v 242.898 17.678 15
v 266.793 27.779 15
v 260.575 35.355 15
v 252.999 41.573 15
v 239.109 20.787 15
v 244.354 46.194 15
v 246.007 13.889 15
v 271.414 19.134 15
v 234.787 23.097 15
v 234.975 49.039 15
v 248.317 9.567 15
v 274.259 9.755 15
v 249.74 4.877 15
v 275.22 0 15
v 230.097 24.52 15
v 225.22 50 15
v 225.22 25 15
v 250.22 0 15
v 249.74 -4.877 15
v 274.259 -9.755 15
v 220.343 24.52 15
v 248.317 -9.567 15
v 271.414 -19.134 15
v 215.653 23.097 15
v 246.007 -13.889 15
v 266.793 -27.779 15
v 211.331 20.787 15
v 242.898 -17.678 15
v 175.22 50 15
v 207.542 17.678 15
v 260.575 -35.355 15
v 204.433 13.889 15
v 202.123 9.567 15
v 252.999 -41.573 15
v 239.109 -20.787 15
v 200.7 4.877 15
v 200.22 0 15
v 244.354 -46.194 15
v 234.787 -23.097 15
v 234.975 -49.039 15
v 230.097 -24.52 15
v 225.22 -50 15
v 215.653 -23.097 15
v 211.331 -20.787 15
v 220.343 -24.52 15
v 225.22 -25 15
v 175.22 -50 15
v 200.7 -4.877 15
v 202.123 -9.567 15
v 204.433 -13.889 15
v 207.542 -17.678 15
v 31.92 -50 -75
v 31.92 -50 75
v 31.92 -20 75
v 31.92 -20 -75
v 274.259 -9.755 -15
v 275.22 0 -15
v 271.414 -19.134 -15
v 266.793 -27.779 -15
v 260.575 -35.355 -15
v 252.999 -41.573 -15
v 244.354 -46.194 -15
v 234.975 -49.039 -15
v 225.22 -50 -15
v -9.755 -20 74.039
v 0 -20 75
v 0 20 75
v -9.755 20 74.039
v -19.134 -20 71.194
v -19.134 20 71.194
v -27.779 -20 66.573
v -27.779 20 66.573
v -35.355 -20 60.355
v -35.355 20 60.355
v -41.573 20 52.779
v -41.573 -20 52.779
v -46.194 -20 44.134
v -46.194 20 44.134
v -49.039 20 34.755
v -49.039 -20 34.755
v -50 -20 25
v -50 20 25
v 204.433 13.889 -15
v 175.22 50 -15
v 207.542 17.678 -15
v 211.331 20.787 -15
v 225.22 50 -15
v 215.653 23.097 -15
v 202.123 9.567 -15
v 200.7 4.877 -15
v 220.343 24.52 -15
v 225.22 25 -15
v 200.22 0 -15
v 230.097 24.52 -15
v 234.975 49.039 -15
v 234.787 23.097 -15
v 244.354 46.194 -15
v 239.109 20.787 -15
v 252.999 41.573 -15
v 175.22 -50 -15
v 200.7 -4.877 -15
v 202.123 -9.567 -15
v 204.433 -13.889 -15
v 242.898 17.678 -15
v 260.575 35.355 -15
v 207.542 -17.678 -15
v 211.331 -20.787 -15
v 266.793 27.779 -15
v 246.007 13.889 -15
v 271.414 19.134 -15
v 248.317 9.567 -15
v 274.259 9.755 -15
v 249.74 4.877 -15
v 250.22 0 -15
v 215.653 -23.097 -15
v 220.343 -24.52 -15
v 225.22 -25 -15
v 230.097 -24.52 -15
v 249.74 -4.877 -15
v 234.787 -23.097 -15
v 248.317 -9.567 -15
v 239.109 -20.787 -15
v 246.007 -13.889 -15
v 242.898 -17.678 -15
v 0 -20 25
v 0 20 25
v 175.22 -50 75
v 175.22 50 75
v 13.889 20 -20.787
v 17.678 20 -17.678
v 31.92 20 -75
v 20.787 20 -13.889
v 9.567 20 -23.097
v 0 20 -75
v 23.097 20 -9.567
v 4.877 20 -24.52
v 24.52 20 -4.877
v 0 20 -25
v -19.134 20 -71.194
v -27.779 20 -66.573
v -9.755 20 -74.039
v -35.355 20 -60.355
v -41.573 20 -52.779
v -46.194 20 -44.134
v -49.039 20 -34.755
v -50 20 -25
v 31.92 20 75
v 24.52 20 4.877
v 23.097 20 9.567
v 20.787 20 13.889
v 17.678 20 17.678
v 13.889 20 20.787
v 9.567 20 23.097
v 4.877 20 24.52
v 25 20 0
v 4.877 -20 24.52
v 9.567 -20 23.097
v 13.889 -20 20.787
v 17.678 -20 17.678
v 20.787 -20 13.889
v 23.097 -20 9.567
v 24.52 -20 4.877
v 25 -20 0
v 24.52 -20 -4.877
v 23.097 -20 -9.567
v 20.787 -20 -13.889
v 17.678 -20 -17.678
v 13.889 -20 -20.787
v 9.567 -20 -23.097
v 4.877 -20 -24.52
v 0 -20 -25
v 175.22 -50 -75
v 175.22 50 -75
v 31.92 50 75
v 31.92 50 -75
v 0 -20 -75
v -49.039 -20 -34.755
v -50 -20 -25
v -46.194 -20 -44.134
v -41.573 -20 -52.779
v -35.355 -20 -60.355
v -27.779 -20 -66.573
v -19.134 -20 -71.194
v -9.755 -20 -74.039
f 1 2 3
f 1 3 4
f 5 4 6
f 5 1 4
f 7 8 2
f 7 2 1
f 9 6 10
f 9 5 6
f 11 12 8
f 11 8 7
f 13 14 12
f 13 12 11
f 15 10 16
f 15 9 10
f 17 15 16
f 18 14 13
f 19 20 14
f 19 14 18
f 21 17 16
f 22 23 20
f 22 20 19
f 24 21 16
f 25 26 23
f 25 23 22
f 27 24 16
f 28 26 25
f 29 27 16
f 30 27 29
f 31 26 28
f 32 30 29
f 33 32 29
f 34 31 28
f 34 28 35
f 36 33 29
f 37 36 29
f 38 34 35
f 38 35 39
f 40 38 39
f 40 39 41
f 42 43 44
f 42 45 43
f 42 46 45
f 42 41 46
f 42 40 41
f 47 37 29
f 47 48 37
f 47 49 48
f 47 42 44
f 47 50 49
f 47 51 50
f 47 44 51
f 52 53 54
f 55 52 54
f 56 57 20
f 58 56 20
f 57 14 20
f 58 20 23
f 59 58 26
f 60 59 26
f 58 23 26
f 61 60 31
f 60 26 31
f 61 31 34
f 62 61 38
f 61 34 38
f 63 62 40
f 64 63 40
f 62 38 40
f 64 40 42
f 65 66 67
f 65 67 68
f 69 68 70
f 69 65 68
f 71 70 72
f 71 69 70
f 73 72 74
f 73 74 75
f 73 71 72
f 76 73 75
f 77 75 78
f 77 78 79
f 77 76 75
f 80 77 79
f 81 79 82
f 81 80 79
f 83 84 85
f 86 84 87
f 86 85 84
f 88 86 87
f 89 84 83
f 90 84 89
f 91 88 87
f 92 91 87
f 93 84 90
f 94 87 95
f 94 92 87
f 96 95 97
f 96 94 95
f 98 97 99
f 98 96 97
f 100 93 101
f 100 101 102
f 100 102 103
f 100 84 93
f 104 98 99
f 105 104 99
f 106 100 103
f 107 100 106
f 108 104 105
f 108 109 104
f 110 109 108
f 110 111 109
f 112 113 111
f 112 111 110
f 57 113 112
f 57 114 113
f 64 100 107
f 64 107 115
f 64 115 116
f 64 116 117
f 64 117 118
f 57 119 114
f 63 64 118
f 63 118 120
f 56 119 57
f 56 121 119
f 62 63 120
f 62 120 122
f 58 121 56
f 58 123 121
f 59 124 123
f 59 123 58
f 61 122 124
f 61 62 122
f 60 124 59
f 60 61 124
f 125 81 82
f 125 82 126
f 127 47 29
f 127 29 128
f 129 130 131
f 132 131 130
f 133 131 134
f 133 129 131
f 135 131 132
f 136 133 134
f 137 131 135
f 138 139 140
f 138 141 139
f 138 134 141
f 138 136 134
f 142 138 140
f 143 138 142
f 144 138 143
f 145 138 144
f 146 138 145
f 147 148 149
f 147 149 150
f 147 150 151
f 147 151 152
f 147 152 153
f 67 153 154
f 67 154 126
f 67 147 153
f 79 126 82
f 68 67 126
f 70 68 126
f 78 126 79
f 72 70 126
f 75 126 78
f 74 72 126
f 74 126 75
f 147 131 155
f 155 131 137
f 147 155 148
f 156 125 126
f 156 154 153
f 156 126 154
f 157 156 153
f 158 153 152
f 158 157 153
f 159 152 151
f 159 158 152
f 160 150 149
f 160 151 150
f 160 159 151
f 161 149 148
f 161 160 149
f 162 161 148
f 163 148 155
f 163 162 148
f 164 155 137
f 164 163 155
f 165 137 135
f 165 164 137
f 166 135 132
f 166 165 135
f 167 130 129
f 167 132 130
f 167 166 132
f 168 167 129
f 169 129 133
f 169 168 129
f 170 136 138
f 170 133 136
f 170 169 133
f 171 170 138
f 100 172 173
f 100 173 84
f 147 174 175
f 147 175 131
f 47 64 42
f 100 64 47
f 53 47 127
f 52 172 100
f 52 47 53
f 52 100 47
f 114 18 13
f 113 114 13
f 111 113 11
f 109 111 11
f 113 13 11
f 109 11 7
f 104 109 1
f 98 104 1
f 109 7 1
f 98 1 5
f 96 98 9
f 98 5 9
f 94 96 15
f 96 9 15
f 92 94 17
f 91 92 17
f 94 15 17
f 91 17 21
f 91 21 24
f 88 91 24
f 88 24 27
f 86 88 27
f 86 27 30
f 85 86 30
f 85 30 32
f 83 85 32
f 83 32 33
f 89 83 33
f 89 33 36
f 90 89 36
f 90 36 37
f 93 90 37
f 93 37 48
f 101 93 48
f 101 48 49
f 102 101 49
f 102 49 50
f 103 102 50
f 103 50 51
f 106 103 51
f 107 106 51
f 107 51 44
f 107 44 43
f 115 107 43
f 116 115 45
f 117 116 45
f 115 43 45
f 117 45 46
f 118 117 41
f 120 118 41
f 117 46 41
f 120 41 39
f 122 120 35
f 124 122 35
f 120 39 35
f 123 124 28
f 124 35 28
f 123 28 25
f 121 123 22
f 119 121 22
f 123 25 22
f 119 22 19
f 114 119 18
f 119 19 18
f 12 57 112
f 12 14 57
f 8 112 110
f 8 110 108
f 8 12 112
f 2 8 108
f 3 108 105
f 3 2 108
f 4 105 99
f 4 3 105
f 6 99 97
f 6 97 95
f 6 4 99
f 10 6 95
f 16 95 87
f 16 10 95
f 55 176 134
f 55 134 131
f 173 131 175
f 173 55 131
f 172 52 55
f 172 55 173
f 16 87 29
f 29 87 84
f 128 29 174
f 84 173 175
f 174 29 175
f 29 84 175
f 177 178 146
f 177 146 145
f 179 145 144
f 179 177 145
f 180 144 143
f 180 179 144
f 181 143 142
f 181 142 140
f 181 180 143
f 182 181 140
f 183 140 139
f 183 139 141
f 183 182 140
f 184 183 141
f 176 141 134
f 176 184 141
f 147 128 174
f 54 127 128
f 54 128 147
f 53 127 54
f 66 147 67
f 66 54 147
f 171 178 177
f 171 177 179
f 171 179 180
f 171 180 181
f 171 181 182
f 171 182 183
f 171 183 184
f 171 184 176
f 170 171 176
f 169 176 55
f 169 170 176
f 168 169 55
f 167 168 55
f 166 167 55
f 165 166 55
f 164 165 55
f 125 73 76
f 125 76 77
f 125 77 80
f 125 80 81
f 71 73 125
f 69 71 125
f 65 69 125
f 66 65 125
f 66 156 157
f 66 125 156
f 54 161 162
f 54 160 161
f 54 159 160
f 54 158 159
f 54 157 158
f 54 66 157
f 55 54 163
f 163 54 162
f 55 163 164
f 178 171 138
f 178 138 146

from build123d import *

# Parameters (mm, degrees)
BOSS_EXTRUDE1_DEPTH      = 50
BOSS_EXTRUDE1_DEPTH_BACK = 50
FILLET1_R                = 50
CUT_EXTRUDE1_DEPTH       = 298.062325719
CUT_EXTRUDE1_DEPTH_BACK  = 298.062325719
HOLE1_D                  = 50


with BuildPart() as part:
    # Sketch1 → Boss-Extrude1 (new, two sides: drawn at the far end of the back side and taken through both)
    with BuildSketch(Plane(origin=(0, 0, 0), x_dir=(1, 0, 0), z_dir=(0, 1, 0)).offset(-BOSS_EXTRUDE1_DEPTH_BACK)):
        with BuildLine():
            Line((-50, -25), (0, -25))
            ThreePointArc((0, -25), (25, 0), (0, 25))
            Line((0, 25), (-50, 25))
            ThreePointArc((-50, 25), (-35.355339059, 60.355339059), (0, 75))
            Line((0, 75), (175.219958145, 75))
            Line((175.219958145, 75), (175.219958145, 15))
            Line((175.219958145, 15), (275.219958145, 15))
            Line((275.219958145, 15), (275.219958145, -15))
            Line((275.219958145, -15), (175.219958145, -15))
            Line((175.219958145, -15), (175.219958145, -75))
            Line((175.219958145, -75), (0, -75))
            ThreePointArc((0, -75), (-35.355339059, -60.355339059), (-50, -25))
        make_face()
    extrude(amount=BOSS_EXTRUDE1_DEPTH + BOSS_EXTRUDE1_DEPTH_BACK)

    # Fillet1
    fillet1_edges = [part.edges().sort_by_distance(p)[0] for p in [
        (275.219958145, 50, 0),
        (275.219958145, -50, 0),
    ]]
    fillet(fillet1_edges, radius=FILLET1_R - 0.0001)  # a hair under: the kernel refuses the full size

    # Sketch4 → Cut-Extrude1 (cut, two sides: drawn at the far end of the back side and taken through both)
    with BuildSketch(Plane(origin=(0, 0, 25), x_dir=(-1, 0, 0), z_dir=(0, 0, -1)).offset(-CUT_EXTRUDE1_DEPTH_BACK)):
        Polygon((0, 20), (50, 20), (50, 50), (0, 50), (-31.919958145, 50), (-31.919958145, 20), align=None)
        Polygon((0, -20), (50, -20), (50, -50), (0, -50), (-31.919958145, -50), (-31.919958145, -20), align=None)
    extrude(amount=CUT_EXTRUDE1_DEPTH + CUT_EXTRUDE1_DEPTH_BACK, mode=Mode.SUBTRACT)

    # Hole1 (through all)
    with Locations(Plane(origin=(0, 0, -15), x_dir=(-1, 0, 0), z_dir=(0, 0, -1))):
        with Locations((-225.219958145, 0)):
            Hole(HOLE1_D / 2)


solid = part.part
